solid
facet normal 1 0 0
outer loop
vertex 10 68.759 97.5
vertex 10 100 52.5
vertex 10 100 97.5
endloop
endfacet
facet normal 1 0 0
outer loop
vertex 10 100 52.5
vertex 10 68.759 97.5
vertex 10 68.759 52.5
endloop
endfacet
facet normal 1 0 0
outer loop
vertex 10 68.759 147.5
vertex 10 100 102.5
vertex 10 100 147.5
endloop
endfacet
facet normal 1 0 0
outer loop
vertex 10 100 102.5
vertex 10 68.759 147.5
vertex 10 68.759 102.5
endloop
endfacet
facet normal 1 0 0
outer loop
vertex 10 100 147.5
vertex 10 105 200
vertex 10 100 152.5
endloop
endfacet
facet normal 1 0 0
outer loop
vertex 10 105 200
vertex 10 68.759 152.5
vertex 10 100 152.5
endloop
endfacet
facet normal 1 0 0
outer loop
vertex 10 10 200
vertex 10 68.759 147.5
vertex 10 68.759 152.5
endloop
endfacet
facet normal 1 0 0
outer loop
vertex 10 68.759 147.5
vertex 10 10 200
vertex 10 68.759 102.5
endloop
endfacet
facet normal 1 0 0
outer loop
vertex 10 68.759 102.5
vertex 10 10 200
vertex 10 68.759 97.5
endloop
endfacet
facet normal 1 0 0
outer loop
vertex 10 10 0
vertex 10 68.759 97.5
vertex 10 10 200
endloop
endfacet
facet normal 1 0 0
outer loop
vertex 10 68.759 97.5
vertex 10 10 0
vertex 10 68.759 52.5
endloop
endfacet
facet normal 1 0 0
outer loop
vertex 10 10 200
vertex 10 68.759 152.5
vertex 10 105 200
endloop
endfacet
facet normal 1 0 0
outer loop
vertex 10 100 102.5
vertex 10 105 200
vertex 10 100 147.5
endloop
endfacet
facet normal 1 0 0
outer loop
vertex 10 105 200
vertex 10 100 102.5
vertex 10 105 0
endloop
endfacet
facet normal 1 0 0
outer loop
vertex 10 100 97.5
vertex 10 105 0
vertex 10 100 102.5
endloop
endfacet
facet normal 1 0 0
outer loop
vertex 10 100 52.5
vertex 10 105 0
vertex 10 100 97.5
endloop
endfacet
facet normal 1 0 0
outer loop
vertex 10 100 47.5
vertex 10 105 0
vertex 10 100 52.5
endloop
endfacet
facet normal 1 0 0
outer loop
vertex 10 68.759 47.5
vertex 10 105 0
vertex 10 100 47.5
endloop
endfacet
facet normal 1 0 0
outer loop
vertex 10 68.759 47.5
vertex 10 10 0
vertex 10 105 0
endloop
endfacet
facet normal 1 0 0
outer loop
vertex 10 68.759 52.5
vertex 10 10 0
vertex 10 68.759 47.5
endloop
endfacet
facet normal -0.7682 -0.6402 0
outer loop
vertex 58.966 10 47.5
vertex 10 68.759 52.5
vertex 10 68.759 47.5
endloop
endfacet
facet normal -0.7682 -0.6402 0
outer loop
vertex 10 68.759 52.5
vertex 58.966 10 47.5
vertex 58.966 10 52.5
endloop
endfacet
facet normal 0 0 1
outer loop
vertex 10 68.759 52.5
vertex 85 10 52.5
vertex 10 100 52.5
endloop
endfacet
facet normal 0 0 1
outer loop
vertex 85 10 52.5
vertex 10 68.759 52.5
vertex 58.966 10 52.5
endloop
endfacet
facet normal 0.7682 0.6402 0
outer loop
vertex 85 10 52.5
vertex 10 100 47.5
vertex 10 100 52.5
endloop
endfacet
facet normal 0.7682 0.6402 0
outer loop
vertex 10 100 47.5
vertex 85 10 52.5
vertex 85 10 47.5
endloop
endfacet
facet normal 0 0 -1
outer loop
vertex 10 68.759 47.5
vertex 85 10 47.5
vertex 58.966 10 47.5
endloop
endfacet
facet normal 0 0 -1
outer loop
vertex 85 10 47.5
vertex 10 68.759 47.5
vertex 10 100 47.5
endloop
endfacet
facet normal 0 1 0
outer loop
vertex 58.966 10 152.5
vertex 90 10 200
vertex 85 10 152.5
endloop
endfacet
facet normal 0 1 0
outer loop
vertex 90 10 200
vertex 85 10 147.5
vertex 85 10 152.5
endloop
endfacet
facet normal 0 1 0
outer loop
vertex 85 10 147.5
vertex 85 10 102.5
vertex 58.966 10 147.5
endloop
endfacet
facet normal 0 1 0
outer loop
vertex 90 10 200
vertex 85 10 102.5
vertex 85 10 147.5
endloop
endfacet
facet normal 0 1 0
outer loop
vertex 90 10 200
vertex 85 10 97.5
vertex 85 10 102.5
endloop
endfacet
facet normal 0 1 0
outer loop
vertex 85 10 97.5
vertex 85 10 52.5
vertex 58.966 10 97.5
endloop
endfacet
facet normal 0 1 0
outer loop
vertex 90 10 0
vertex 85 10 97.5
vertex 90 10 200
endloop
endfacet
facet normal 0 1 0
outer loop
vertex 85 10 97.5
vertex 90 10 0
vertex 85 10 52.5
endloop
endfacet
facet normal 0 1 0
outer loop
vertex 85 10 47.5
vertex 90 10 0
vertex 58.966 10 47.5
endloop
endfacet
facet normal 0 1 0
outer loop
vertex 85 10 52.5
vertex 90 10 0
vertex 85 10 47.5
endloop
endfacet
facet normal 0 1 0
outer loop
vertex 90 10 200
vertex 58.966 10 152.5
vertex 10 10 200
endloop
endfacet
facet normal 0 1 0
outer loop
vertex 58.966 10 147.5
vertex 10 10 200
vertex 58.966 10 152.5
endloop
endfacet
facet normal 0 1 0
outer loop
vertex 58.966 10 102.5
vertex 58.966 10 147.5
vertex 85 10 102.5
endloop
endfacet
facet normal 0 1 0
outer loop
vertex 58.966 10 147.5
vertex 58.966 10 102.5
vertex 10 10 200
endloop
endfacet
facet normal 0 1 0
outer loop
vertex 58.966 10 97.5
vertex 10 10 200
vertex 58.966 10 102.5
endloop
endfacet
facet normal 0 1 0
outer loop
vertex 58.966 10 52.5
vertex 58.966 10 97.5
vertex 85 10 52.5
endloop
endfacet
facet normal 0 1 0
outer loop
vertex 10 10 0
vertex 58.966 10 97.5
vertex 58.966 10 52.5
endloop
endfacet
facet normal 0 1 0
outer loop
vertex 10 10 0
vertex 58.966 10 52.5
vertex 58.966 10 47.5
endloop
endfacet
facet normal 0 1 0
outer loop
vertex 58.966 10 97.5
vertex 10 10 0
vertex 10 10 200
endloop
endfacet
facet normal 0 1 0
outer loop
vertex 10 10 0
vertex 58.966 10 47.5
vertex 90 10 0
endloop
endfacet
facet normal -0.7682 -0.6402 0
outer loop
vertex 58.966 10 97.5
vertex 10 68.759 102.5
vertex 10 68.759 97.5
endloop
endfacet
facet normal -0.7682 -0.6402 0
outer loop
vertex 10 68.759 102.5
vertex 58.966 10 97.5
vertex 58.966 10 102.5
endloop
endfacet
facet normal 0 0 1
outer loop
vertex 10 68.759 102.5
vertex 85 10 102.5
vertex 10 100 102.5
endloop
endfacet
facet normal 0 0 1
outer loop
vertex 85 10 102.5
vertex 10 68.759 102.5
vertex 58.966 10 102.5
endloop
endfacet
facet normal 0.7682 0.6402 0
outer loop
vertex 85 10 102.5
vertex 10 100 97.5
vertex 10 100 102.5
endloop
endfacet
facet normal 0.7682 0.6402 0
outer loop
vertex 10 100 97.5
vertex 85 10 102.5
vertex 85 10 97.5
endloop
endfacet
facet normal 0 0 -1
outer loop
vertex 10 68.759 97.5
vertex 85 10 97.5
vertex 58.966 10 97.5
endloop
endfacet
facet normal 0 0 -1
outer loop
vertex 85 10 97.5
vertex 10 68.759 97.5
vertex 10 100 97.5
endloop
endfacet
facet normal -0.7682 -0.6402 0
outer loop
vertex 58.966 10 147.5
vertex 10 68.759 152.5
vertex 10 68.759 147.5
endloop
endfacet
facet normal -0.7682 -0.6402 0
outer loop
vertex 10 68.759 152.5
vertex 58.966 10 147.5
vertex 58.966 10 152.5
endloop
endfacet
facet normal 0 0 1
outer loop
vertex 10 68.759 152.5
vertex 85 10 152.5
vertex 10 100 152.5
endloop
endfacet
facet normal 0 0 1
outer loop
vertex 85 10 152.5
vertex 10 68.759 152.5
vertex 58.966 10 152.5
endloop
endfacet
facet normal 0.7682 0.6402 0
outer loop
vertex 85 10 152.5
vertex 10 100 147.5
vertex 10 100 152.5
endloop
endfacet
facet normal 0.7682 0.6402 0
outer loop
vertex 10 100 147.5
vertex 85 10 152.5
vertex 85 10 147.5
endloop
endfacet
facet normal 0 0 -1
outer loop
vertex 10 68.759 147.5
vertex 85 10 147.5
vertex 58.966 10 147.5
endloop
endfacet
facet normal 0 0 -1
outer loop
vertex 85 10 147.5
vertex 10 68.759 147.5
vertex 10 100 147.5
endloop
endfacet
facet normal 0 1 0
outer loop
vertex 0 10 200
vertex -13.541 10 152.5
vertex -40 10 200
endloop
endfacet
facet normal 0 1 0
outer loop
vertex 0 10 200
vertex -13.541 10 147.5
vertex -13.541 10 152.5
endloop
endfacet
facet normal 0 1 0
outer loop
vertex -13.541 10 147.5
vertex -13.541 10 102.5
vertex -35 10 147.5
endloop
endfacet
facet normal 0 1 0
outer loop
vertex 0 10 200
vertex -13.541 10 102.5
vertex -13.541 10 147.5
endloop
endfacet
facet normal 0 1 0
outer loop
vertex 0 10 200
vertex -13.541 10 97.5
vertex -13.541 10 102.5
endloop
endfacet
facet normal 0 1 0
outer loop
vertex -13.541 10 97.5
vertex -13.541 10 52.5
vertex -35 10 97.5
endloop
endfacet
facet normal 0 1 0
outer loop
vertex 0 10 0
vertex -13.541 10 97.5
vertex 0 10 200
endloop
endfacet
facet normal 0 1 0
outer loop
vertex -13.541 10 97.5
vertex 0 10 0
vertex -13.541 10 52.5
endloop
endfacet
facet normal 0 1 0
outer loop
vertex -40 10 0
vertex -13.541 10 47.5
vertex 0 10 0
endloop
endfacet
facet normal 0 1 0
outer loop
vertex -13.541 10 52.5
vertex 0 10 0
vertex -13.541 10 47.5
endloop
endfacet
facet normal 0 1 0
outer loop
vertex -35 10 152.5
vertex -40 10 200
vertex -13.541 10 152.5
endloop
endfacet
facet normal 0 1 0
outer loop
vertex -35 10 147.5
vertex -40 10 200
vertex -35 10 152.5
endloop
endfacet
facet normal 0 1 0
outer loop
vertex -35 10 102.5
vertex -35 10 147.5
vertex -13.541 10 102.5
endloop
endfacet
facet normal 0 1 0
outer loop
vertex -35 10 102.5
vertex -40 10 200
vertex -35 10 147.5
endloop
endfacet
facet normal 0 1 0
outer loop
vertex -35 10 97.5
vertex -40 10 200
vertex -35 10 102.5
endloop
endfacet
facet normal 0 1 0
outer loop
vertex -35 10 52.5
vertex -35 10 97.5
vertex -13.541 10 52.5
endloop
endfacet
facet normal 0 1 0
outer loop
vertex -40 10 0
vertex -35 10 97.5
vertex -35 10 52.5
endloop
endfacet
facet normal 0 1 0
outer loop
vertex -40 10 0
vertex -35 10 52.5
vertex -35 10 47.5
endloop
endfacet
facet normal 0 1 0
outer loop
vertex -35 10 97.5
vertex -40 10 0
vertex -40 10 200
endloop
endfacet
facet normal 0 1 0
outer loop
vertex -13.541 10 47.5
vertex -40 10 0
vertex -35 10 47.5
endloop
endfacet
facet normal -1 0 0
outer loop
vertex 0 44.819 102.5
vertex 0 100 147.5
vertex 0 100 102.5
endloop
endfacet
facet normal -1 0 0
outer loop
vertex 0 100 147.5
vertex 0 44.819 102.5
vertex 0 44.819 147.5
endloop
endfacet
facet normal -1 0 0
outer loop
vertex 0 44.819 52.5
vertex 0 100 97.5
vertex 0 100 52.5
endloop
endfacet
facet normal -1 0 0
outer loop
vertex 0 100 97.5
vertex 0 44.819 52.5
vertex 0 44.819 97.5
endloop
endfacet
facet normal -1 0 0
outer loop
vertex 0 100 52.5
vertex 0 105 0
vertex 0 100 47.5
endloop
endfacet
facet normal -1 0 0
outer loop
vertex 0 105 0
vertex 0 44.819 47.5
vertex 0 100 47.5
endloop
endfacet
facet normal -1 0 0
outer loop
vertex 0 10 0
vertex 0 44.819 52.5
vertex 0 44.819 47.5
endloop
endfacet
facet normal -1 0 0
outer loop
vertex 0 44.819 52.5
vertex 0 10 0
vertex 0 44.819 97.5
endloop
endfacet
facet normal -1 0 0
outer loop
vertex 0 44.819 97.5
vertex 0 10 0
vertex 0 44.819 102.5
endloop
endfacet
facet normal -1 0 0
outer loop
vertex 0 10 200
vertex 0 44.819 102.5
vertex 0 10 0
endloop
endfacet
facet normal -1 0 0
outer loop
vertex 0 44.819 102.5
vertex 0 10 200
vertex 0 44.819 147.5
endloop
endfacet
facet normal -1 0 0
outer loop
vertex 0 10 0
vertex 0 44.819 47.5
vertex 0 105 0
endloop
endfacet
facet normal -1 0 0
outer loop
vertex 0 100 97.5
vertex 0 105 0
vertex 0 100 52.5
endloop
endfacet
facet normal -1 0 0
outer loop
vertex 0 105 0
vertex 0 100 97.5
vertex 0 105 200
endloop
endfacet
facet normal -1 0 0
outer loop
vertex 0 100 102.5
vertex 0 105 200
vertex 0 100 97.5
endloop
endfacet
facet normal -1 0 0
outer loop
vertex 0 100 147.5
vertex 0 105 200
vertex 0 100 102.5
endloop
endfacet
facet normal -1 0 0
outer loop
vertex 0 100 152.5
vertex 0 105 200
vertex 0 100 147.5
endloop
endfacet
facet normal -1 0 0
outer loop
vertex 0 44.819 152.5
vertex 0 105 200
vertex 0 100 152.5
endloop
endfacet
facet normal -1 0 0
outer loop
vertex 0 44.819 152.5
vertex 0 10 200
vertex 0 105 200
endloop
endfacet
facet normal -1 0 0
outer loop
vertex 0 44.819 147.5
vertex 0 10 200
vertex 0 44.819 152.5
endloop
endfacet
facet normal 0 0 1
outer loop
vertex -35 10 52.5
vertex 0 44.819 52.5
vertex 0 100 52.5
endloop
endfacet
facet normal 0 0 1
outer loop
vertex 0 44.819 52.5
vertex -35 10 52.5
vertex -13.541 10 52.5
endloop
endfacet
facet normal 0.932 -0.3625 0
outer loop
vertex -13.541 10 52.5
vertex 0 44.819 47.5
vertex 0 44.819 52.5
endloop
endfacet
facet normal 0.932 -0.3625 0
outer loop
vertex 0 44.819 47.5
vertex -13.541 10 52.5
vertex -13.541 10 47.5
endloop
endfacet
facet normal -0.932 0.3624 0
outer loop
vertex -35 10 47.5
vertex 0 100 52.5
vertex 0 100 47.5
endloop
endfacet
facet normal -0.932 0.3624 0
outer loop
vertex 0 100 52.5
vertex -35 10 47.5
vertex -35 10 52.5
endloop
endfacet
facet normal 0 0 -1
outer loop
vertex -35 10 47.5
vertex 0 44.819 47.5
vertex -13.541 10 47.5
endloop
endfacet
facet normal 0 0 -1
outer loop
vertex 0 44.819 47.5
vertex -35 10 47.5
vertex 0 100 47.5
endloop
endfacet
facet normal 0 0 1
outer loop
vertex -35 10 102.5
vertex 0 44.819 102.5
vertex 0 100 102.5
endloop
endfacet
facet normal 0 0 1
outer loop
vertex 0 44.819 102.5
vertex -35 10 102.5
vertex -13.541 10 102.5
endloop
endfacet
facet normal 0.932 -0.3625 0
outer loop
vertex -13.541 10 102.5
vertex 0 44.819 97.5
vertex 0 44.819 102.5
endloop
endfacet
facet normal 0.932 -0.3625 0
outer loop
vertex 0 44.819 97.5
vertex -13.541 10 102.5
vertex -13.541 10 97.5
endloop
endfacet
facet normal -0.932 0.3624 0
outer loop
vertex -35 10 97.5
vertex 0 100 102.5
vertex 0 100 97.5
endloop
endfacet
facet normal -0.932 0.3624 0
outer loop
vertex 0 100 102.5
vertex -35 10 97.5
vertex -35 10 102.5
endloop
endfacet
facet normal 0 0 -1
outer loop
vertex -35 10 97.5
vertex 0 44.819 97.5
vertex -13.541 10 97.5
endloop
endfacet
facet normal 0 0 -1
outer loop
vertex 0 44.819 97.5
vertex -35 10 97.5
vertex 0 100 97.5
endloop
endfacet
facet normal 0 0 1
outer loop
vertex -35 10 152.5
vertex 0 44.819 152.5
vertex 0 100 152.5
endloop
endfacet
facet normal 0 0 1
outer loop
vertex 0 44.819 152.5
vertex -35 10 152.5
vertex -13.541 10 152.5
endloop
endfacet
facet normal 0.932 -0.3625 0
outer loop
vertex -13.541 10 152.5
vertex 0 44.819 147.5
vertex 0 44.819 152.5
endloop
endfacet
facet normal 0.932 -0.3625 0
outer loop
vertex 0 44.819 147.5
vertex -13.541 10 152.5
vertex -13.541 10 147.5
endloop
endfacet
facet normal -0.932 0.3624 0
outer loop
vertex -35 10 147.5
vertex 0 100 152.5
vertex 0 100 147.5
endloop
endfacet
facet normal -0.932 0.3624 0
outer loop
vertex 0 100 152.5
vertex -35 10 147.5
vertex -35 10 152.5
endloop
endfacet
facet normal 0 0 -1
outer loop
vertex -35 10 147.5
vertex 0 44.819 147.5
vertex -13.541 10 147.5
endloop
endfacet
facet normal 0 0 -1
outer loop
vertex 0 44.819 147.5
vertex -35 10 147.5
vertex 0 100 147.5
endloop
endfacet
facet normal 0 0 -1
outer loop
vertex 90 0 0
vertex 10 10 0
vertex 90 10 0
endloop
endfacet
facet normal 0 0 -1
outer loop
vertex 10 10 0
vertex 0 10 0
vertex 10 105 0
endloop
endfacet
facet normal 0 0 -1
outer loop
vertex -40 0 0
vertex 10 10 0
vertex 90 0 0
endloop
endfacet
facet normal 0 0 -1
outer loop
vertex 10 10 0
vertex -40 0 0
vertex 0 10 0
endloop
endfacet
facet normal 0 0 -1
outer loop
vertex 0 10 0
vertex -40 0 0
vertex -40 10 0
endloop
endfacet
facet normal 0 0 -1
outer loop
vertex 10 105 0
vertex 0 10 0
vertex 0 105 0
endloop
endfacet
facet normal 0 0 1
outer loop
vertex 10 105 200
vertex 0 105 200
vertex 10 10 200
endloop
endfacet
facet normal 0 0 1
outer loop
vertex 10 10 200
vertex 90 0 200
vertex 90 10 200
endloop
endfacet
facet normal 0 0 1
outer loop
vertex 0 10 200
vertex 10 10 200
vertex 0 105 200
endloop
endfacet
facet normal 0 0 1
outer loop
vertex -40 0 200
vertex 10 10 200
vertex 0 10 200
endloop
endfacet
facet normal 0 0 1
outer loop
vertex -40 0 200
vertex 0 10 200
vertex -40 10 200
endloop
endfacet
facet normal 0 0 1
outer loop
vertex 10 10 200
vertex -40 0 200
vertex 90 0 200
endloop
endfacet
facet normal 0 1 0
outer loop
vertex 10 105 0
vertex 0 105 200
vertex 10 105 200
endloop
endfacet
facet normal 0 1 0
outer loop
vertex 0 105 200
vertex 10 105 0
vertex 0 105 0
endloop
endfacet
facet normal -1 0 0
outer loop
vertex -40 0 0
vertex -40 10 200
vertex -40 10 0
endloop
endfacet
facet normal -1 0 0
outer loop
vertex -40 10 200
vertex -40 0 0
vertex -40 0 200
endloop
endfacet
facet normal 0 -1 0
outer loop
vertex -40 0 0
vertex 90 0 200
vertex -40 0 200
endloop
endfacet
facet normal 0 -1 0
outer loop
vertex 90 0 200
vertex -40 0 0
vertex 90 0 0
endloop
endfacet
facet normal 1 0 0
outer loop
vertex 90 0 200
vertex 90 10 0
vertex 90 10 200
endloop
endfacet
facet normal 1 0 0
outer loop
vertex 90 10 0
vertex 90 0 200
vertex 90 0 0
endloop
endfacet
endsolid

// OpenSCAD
// Scooter Under Bed Stand - T BRACKET VERSION
// Modified L-bracket with base extending both left and right from vertical wall
// Default: 200mm length, 95mm right base, 40mm left base, 95mm height

// Parameters (in mm)
length = 200;               // Length of the bracket (extrusion direction)
base_width_right = 80;     // Width of base extending to the RIGHT of vertical wall
base_width_left = 40;      // Width of base extending to the LEFT of vertical wall
height = 105;               // Height of the vertical wall
wall_thickness = 10;       // Thickness of the walls

// ========== FILLET CONTROL ==========
add_fillets = false;       // Enable/disable all rounded corners and edges
fillet_radius = 3;         // Outer fillet radius (in mm)
inner_fillet_radius = 3;   // Inner corner fillet radius (in mm)
// =====================================


// ========== GUSSET REINFORCEMENT ==========
add_gussets_left = true;   // Enable LEFT side gussets
add_gussets_right = true;  // Enable RIGHT side gussets
gusset_size = 80;          // Size of triangular gusset (mm)
gusset_thickness = 5;      // Thickness of each gusset (mm)
gusset_margin = 5;         // Gap between gusset edge and base/wall edge (mm)
gusset_rib_width = 20;     // Width of diagonal rib (material to keep along hypotenuse)
num_gussets = 3;           // Number of gussets along the length
// ==========================================

// Resolution for smooth curves
$fn = 40;

// Basic T-shape profile (2D)
// The vertical wall sits on top of a base that extends both directions
// base_width_left and base_width_right represent actual usable base surfaces
module T_profile_2D() {
    difference() {
        // Outer T shape
        polygon(points = [
            // Start from bottom left of left base
            [-base_width_left, 0],
            // Go to bottom right of right base (wall_thickness + base_width_right)
            [wall_thickness + base_width_right, 0],
            // Go up to wall thickness
            [wall_thickness + base_width_right, wall_thickness],
            // Go left to the vertical wall right edge
            [wall_thickness, wall_thickness],
            // Go up the vertical wall
            [wall_thickness, height],
            // Go left to vertical wall left edge
            [0, height],
            // Go down to base level
            [0, wall_thickness],
            // Go left to left base edge
            [-base_width_left, wall_thickness],
            // Close the polygon back to start
        ]);
    }
}

// T-shape with rounded outer edges (2D)
module T_profile_rounded_2D() {
    offset(r = fillet_radius)
        offset(r = -fillet_radius)
            T_profile_2D();
}

// Simple T bracket extruded (no fillets)
module T_bracket_simple() {
    linear_extrude(height = length)
        T_profile_2D();
}

// T bracket with filleted inner corners
module T_bracket_filleted() {
    r = inner_fillet_radius;
    fr = fillet_radius;

    // Use minkowski to round all edges including the ends
    minkowski() {
        // Shrink the profile and length to compensate for minkowski expansion
        translate([fr, fr, fr])
            linear_extrude(height = length - 2*fr) {
                offset(r = -fr)
                    T_profile_2D();
            }

        // Sphere adds rounding to all edges and corners
        sphere(r = fr);
    }

    // Add inner corner fillets (rounded inside corners for strength)
    // Right corner (between vertical wall and right base)
    translate([wall_thickness, wall_thickness, fr])
        difference() {
            cube([r, r, length - 2*fr]);
            translate([r, r, -1])
                cylinder(h = length - 2*fr + 2, r = r);
        }

    // Left corner (between vertical wall and left base)
    translate([0, wall_thickness, fr])
        difference() {
            cube([r, r, length - 2*fr]);
            translate([0, r, -1])
                cylinder(h = length - 2*fr + 2, r = r);
        }
}

// Triangular gusset module with inner cutout (can be rectangular triangle)
module gusset(width, height, thickness) {
    // Triangle in the XY plane with cutout for weight reduction, extruded along Z
    linear_extrude(height = thickness) {
        difference() {
            // Original outer triangle
            polygon(points = [
                [0, 0],
                [width, 0],
                [0, height]
            ]);

            // Inner cutout triangle - leaves gusset_rib_width material along hypotenuse
            // Calculate the cutout size to leave the desired rib width
            hyp = sqrt(width*width + height*height);  // Hypotenuse length
            offset_val = width*height - gusset_rib_width*hyp;  // Offset calculation
            cutout_base_x = offset_val / height;  // X point on base
            cutout_vert_y = offset_val / width;   // Y point on vertical

            // Only add cutout if there's enough material
            if (cutout_base_x > 0 && cutout_vert_y > 0) {
                polygon(points = [
                    [0, 0],
                    [cutout_base_x, 0],
                    [0, cutout_vert_y]
                ]);
            }
        }
    }
}

// T bracket with gusset reinforcements
module T_bracket_with_gussets() {
    usable_length = add_fillets ? length - 2*fillet_radius : length;  // Account for rounded ends if fillets enabled
    gusset_spacing = usable_length / (num_gussets + 1);
    gusset_offset = add_fillets ? fillet_radius : 0;  // Offset gussets if fillets are enabled

    // Calculate actual gusset dimensions for RIGHT side
    max_gusset_width_right = base_width_right - gusset_margin;  // Available space on right base
    max_gusset_height = height - wall_thickness - gusset_margin;  // Available space on vertical wall
    actual_gusset_width_right = min(gusset_size, max_gusset_width_right);  // Limit by base width and gusset_size
    actual_gusset_height = max_gusset_height;  // Always follow the wall height (no gusset_size limit)

    // Calculate actual gusset dimensions for LEFT side (same formula as right for symmetry)
    max_gusset_width_left = base_width_left - gusset_margin;  // Same calculation for symmetry
    actual_gusset_width_left = min(gusset_size, max_gusset_width_left);  // Limit by base width and gusset_size

    union() {
        // Base T bracket - choose filleted or simple based on add_fillets parameter
        if (add_fillets) {
            T_bracket_filleted();
        } else {
            T_bracket_simple();
        }

        // X offset for gussets when fillets are enabled (geometry shifts by fillet_radius)
        gusset_x_offset = add_fillets ? fillet_radius : 0;

        // Add gussets along the RIGHT inner corner
        if (add_gussets_right) {
            for (i = [1:num_gussets]) {
                translate([wall_thickness + gusset_x_offset, wall_thickness + gusset_x_offset, gusset_offset + i * gusset_spacing - gusset_thickness/2])
                    gusset(actual_gusset_width_right, actual_gusset_height, gusset_thickness);
            }
        }

        // Add gussets along the LEFT inner corner (mirrored)
        if (add_gussets_left) {
            for (i = [1:num_gussets]) {
                translate([gusset_x_offset, wall_thickness + gusset_x_offset, gusset_offset + i * gusset_spacing - gusset_thickness/2])
                    mirror([1, 0, 0])  // Mirror to face left
                        gusset(actual_gusset_width_left, actual_gusset_height, gusset_thickness);
            }
        }
    }
}

// Render the T bracket
T_bracket_with_gussets();

// Preview info
echo(str("T Bracket dimensions:"));
echo(str("  Length: ", length, "mm (", length/10, "cm)"));
echo(str("  Base width RIGHT: ", base_width_right, "mm (", base_width_right/10, "cm)"));
echo(str("  Base width LEFT: ", base_width_left, "mm (", base_width_left/10, "cm)"));
echo(str("  Total base width: ", base_width_right + base_width_left + wall_thickness, "mm (", (base_width_right + base_width_left + wall_thickness)/10, "cm)"));
echo(str("  Height: ", height, "mm (", height/10, "cm)"));
echo(str("  Wall thickness: ", wall_thickness, "mm"));
echo(str("  Fillets: ", add_fillets ? "ENABLED" : "DISABLED"));
echo(str("  Gussets LEFT: ", add_gussets_left ? "ENABLED" : "DISABLED"));
echo(str("  Gussets RIGHT: ", add_gussets_right ? "ENABLED" : "DISABLED"));
echo(str("  Gusset thickness: ", gusset_thickness, "mm"));
